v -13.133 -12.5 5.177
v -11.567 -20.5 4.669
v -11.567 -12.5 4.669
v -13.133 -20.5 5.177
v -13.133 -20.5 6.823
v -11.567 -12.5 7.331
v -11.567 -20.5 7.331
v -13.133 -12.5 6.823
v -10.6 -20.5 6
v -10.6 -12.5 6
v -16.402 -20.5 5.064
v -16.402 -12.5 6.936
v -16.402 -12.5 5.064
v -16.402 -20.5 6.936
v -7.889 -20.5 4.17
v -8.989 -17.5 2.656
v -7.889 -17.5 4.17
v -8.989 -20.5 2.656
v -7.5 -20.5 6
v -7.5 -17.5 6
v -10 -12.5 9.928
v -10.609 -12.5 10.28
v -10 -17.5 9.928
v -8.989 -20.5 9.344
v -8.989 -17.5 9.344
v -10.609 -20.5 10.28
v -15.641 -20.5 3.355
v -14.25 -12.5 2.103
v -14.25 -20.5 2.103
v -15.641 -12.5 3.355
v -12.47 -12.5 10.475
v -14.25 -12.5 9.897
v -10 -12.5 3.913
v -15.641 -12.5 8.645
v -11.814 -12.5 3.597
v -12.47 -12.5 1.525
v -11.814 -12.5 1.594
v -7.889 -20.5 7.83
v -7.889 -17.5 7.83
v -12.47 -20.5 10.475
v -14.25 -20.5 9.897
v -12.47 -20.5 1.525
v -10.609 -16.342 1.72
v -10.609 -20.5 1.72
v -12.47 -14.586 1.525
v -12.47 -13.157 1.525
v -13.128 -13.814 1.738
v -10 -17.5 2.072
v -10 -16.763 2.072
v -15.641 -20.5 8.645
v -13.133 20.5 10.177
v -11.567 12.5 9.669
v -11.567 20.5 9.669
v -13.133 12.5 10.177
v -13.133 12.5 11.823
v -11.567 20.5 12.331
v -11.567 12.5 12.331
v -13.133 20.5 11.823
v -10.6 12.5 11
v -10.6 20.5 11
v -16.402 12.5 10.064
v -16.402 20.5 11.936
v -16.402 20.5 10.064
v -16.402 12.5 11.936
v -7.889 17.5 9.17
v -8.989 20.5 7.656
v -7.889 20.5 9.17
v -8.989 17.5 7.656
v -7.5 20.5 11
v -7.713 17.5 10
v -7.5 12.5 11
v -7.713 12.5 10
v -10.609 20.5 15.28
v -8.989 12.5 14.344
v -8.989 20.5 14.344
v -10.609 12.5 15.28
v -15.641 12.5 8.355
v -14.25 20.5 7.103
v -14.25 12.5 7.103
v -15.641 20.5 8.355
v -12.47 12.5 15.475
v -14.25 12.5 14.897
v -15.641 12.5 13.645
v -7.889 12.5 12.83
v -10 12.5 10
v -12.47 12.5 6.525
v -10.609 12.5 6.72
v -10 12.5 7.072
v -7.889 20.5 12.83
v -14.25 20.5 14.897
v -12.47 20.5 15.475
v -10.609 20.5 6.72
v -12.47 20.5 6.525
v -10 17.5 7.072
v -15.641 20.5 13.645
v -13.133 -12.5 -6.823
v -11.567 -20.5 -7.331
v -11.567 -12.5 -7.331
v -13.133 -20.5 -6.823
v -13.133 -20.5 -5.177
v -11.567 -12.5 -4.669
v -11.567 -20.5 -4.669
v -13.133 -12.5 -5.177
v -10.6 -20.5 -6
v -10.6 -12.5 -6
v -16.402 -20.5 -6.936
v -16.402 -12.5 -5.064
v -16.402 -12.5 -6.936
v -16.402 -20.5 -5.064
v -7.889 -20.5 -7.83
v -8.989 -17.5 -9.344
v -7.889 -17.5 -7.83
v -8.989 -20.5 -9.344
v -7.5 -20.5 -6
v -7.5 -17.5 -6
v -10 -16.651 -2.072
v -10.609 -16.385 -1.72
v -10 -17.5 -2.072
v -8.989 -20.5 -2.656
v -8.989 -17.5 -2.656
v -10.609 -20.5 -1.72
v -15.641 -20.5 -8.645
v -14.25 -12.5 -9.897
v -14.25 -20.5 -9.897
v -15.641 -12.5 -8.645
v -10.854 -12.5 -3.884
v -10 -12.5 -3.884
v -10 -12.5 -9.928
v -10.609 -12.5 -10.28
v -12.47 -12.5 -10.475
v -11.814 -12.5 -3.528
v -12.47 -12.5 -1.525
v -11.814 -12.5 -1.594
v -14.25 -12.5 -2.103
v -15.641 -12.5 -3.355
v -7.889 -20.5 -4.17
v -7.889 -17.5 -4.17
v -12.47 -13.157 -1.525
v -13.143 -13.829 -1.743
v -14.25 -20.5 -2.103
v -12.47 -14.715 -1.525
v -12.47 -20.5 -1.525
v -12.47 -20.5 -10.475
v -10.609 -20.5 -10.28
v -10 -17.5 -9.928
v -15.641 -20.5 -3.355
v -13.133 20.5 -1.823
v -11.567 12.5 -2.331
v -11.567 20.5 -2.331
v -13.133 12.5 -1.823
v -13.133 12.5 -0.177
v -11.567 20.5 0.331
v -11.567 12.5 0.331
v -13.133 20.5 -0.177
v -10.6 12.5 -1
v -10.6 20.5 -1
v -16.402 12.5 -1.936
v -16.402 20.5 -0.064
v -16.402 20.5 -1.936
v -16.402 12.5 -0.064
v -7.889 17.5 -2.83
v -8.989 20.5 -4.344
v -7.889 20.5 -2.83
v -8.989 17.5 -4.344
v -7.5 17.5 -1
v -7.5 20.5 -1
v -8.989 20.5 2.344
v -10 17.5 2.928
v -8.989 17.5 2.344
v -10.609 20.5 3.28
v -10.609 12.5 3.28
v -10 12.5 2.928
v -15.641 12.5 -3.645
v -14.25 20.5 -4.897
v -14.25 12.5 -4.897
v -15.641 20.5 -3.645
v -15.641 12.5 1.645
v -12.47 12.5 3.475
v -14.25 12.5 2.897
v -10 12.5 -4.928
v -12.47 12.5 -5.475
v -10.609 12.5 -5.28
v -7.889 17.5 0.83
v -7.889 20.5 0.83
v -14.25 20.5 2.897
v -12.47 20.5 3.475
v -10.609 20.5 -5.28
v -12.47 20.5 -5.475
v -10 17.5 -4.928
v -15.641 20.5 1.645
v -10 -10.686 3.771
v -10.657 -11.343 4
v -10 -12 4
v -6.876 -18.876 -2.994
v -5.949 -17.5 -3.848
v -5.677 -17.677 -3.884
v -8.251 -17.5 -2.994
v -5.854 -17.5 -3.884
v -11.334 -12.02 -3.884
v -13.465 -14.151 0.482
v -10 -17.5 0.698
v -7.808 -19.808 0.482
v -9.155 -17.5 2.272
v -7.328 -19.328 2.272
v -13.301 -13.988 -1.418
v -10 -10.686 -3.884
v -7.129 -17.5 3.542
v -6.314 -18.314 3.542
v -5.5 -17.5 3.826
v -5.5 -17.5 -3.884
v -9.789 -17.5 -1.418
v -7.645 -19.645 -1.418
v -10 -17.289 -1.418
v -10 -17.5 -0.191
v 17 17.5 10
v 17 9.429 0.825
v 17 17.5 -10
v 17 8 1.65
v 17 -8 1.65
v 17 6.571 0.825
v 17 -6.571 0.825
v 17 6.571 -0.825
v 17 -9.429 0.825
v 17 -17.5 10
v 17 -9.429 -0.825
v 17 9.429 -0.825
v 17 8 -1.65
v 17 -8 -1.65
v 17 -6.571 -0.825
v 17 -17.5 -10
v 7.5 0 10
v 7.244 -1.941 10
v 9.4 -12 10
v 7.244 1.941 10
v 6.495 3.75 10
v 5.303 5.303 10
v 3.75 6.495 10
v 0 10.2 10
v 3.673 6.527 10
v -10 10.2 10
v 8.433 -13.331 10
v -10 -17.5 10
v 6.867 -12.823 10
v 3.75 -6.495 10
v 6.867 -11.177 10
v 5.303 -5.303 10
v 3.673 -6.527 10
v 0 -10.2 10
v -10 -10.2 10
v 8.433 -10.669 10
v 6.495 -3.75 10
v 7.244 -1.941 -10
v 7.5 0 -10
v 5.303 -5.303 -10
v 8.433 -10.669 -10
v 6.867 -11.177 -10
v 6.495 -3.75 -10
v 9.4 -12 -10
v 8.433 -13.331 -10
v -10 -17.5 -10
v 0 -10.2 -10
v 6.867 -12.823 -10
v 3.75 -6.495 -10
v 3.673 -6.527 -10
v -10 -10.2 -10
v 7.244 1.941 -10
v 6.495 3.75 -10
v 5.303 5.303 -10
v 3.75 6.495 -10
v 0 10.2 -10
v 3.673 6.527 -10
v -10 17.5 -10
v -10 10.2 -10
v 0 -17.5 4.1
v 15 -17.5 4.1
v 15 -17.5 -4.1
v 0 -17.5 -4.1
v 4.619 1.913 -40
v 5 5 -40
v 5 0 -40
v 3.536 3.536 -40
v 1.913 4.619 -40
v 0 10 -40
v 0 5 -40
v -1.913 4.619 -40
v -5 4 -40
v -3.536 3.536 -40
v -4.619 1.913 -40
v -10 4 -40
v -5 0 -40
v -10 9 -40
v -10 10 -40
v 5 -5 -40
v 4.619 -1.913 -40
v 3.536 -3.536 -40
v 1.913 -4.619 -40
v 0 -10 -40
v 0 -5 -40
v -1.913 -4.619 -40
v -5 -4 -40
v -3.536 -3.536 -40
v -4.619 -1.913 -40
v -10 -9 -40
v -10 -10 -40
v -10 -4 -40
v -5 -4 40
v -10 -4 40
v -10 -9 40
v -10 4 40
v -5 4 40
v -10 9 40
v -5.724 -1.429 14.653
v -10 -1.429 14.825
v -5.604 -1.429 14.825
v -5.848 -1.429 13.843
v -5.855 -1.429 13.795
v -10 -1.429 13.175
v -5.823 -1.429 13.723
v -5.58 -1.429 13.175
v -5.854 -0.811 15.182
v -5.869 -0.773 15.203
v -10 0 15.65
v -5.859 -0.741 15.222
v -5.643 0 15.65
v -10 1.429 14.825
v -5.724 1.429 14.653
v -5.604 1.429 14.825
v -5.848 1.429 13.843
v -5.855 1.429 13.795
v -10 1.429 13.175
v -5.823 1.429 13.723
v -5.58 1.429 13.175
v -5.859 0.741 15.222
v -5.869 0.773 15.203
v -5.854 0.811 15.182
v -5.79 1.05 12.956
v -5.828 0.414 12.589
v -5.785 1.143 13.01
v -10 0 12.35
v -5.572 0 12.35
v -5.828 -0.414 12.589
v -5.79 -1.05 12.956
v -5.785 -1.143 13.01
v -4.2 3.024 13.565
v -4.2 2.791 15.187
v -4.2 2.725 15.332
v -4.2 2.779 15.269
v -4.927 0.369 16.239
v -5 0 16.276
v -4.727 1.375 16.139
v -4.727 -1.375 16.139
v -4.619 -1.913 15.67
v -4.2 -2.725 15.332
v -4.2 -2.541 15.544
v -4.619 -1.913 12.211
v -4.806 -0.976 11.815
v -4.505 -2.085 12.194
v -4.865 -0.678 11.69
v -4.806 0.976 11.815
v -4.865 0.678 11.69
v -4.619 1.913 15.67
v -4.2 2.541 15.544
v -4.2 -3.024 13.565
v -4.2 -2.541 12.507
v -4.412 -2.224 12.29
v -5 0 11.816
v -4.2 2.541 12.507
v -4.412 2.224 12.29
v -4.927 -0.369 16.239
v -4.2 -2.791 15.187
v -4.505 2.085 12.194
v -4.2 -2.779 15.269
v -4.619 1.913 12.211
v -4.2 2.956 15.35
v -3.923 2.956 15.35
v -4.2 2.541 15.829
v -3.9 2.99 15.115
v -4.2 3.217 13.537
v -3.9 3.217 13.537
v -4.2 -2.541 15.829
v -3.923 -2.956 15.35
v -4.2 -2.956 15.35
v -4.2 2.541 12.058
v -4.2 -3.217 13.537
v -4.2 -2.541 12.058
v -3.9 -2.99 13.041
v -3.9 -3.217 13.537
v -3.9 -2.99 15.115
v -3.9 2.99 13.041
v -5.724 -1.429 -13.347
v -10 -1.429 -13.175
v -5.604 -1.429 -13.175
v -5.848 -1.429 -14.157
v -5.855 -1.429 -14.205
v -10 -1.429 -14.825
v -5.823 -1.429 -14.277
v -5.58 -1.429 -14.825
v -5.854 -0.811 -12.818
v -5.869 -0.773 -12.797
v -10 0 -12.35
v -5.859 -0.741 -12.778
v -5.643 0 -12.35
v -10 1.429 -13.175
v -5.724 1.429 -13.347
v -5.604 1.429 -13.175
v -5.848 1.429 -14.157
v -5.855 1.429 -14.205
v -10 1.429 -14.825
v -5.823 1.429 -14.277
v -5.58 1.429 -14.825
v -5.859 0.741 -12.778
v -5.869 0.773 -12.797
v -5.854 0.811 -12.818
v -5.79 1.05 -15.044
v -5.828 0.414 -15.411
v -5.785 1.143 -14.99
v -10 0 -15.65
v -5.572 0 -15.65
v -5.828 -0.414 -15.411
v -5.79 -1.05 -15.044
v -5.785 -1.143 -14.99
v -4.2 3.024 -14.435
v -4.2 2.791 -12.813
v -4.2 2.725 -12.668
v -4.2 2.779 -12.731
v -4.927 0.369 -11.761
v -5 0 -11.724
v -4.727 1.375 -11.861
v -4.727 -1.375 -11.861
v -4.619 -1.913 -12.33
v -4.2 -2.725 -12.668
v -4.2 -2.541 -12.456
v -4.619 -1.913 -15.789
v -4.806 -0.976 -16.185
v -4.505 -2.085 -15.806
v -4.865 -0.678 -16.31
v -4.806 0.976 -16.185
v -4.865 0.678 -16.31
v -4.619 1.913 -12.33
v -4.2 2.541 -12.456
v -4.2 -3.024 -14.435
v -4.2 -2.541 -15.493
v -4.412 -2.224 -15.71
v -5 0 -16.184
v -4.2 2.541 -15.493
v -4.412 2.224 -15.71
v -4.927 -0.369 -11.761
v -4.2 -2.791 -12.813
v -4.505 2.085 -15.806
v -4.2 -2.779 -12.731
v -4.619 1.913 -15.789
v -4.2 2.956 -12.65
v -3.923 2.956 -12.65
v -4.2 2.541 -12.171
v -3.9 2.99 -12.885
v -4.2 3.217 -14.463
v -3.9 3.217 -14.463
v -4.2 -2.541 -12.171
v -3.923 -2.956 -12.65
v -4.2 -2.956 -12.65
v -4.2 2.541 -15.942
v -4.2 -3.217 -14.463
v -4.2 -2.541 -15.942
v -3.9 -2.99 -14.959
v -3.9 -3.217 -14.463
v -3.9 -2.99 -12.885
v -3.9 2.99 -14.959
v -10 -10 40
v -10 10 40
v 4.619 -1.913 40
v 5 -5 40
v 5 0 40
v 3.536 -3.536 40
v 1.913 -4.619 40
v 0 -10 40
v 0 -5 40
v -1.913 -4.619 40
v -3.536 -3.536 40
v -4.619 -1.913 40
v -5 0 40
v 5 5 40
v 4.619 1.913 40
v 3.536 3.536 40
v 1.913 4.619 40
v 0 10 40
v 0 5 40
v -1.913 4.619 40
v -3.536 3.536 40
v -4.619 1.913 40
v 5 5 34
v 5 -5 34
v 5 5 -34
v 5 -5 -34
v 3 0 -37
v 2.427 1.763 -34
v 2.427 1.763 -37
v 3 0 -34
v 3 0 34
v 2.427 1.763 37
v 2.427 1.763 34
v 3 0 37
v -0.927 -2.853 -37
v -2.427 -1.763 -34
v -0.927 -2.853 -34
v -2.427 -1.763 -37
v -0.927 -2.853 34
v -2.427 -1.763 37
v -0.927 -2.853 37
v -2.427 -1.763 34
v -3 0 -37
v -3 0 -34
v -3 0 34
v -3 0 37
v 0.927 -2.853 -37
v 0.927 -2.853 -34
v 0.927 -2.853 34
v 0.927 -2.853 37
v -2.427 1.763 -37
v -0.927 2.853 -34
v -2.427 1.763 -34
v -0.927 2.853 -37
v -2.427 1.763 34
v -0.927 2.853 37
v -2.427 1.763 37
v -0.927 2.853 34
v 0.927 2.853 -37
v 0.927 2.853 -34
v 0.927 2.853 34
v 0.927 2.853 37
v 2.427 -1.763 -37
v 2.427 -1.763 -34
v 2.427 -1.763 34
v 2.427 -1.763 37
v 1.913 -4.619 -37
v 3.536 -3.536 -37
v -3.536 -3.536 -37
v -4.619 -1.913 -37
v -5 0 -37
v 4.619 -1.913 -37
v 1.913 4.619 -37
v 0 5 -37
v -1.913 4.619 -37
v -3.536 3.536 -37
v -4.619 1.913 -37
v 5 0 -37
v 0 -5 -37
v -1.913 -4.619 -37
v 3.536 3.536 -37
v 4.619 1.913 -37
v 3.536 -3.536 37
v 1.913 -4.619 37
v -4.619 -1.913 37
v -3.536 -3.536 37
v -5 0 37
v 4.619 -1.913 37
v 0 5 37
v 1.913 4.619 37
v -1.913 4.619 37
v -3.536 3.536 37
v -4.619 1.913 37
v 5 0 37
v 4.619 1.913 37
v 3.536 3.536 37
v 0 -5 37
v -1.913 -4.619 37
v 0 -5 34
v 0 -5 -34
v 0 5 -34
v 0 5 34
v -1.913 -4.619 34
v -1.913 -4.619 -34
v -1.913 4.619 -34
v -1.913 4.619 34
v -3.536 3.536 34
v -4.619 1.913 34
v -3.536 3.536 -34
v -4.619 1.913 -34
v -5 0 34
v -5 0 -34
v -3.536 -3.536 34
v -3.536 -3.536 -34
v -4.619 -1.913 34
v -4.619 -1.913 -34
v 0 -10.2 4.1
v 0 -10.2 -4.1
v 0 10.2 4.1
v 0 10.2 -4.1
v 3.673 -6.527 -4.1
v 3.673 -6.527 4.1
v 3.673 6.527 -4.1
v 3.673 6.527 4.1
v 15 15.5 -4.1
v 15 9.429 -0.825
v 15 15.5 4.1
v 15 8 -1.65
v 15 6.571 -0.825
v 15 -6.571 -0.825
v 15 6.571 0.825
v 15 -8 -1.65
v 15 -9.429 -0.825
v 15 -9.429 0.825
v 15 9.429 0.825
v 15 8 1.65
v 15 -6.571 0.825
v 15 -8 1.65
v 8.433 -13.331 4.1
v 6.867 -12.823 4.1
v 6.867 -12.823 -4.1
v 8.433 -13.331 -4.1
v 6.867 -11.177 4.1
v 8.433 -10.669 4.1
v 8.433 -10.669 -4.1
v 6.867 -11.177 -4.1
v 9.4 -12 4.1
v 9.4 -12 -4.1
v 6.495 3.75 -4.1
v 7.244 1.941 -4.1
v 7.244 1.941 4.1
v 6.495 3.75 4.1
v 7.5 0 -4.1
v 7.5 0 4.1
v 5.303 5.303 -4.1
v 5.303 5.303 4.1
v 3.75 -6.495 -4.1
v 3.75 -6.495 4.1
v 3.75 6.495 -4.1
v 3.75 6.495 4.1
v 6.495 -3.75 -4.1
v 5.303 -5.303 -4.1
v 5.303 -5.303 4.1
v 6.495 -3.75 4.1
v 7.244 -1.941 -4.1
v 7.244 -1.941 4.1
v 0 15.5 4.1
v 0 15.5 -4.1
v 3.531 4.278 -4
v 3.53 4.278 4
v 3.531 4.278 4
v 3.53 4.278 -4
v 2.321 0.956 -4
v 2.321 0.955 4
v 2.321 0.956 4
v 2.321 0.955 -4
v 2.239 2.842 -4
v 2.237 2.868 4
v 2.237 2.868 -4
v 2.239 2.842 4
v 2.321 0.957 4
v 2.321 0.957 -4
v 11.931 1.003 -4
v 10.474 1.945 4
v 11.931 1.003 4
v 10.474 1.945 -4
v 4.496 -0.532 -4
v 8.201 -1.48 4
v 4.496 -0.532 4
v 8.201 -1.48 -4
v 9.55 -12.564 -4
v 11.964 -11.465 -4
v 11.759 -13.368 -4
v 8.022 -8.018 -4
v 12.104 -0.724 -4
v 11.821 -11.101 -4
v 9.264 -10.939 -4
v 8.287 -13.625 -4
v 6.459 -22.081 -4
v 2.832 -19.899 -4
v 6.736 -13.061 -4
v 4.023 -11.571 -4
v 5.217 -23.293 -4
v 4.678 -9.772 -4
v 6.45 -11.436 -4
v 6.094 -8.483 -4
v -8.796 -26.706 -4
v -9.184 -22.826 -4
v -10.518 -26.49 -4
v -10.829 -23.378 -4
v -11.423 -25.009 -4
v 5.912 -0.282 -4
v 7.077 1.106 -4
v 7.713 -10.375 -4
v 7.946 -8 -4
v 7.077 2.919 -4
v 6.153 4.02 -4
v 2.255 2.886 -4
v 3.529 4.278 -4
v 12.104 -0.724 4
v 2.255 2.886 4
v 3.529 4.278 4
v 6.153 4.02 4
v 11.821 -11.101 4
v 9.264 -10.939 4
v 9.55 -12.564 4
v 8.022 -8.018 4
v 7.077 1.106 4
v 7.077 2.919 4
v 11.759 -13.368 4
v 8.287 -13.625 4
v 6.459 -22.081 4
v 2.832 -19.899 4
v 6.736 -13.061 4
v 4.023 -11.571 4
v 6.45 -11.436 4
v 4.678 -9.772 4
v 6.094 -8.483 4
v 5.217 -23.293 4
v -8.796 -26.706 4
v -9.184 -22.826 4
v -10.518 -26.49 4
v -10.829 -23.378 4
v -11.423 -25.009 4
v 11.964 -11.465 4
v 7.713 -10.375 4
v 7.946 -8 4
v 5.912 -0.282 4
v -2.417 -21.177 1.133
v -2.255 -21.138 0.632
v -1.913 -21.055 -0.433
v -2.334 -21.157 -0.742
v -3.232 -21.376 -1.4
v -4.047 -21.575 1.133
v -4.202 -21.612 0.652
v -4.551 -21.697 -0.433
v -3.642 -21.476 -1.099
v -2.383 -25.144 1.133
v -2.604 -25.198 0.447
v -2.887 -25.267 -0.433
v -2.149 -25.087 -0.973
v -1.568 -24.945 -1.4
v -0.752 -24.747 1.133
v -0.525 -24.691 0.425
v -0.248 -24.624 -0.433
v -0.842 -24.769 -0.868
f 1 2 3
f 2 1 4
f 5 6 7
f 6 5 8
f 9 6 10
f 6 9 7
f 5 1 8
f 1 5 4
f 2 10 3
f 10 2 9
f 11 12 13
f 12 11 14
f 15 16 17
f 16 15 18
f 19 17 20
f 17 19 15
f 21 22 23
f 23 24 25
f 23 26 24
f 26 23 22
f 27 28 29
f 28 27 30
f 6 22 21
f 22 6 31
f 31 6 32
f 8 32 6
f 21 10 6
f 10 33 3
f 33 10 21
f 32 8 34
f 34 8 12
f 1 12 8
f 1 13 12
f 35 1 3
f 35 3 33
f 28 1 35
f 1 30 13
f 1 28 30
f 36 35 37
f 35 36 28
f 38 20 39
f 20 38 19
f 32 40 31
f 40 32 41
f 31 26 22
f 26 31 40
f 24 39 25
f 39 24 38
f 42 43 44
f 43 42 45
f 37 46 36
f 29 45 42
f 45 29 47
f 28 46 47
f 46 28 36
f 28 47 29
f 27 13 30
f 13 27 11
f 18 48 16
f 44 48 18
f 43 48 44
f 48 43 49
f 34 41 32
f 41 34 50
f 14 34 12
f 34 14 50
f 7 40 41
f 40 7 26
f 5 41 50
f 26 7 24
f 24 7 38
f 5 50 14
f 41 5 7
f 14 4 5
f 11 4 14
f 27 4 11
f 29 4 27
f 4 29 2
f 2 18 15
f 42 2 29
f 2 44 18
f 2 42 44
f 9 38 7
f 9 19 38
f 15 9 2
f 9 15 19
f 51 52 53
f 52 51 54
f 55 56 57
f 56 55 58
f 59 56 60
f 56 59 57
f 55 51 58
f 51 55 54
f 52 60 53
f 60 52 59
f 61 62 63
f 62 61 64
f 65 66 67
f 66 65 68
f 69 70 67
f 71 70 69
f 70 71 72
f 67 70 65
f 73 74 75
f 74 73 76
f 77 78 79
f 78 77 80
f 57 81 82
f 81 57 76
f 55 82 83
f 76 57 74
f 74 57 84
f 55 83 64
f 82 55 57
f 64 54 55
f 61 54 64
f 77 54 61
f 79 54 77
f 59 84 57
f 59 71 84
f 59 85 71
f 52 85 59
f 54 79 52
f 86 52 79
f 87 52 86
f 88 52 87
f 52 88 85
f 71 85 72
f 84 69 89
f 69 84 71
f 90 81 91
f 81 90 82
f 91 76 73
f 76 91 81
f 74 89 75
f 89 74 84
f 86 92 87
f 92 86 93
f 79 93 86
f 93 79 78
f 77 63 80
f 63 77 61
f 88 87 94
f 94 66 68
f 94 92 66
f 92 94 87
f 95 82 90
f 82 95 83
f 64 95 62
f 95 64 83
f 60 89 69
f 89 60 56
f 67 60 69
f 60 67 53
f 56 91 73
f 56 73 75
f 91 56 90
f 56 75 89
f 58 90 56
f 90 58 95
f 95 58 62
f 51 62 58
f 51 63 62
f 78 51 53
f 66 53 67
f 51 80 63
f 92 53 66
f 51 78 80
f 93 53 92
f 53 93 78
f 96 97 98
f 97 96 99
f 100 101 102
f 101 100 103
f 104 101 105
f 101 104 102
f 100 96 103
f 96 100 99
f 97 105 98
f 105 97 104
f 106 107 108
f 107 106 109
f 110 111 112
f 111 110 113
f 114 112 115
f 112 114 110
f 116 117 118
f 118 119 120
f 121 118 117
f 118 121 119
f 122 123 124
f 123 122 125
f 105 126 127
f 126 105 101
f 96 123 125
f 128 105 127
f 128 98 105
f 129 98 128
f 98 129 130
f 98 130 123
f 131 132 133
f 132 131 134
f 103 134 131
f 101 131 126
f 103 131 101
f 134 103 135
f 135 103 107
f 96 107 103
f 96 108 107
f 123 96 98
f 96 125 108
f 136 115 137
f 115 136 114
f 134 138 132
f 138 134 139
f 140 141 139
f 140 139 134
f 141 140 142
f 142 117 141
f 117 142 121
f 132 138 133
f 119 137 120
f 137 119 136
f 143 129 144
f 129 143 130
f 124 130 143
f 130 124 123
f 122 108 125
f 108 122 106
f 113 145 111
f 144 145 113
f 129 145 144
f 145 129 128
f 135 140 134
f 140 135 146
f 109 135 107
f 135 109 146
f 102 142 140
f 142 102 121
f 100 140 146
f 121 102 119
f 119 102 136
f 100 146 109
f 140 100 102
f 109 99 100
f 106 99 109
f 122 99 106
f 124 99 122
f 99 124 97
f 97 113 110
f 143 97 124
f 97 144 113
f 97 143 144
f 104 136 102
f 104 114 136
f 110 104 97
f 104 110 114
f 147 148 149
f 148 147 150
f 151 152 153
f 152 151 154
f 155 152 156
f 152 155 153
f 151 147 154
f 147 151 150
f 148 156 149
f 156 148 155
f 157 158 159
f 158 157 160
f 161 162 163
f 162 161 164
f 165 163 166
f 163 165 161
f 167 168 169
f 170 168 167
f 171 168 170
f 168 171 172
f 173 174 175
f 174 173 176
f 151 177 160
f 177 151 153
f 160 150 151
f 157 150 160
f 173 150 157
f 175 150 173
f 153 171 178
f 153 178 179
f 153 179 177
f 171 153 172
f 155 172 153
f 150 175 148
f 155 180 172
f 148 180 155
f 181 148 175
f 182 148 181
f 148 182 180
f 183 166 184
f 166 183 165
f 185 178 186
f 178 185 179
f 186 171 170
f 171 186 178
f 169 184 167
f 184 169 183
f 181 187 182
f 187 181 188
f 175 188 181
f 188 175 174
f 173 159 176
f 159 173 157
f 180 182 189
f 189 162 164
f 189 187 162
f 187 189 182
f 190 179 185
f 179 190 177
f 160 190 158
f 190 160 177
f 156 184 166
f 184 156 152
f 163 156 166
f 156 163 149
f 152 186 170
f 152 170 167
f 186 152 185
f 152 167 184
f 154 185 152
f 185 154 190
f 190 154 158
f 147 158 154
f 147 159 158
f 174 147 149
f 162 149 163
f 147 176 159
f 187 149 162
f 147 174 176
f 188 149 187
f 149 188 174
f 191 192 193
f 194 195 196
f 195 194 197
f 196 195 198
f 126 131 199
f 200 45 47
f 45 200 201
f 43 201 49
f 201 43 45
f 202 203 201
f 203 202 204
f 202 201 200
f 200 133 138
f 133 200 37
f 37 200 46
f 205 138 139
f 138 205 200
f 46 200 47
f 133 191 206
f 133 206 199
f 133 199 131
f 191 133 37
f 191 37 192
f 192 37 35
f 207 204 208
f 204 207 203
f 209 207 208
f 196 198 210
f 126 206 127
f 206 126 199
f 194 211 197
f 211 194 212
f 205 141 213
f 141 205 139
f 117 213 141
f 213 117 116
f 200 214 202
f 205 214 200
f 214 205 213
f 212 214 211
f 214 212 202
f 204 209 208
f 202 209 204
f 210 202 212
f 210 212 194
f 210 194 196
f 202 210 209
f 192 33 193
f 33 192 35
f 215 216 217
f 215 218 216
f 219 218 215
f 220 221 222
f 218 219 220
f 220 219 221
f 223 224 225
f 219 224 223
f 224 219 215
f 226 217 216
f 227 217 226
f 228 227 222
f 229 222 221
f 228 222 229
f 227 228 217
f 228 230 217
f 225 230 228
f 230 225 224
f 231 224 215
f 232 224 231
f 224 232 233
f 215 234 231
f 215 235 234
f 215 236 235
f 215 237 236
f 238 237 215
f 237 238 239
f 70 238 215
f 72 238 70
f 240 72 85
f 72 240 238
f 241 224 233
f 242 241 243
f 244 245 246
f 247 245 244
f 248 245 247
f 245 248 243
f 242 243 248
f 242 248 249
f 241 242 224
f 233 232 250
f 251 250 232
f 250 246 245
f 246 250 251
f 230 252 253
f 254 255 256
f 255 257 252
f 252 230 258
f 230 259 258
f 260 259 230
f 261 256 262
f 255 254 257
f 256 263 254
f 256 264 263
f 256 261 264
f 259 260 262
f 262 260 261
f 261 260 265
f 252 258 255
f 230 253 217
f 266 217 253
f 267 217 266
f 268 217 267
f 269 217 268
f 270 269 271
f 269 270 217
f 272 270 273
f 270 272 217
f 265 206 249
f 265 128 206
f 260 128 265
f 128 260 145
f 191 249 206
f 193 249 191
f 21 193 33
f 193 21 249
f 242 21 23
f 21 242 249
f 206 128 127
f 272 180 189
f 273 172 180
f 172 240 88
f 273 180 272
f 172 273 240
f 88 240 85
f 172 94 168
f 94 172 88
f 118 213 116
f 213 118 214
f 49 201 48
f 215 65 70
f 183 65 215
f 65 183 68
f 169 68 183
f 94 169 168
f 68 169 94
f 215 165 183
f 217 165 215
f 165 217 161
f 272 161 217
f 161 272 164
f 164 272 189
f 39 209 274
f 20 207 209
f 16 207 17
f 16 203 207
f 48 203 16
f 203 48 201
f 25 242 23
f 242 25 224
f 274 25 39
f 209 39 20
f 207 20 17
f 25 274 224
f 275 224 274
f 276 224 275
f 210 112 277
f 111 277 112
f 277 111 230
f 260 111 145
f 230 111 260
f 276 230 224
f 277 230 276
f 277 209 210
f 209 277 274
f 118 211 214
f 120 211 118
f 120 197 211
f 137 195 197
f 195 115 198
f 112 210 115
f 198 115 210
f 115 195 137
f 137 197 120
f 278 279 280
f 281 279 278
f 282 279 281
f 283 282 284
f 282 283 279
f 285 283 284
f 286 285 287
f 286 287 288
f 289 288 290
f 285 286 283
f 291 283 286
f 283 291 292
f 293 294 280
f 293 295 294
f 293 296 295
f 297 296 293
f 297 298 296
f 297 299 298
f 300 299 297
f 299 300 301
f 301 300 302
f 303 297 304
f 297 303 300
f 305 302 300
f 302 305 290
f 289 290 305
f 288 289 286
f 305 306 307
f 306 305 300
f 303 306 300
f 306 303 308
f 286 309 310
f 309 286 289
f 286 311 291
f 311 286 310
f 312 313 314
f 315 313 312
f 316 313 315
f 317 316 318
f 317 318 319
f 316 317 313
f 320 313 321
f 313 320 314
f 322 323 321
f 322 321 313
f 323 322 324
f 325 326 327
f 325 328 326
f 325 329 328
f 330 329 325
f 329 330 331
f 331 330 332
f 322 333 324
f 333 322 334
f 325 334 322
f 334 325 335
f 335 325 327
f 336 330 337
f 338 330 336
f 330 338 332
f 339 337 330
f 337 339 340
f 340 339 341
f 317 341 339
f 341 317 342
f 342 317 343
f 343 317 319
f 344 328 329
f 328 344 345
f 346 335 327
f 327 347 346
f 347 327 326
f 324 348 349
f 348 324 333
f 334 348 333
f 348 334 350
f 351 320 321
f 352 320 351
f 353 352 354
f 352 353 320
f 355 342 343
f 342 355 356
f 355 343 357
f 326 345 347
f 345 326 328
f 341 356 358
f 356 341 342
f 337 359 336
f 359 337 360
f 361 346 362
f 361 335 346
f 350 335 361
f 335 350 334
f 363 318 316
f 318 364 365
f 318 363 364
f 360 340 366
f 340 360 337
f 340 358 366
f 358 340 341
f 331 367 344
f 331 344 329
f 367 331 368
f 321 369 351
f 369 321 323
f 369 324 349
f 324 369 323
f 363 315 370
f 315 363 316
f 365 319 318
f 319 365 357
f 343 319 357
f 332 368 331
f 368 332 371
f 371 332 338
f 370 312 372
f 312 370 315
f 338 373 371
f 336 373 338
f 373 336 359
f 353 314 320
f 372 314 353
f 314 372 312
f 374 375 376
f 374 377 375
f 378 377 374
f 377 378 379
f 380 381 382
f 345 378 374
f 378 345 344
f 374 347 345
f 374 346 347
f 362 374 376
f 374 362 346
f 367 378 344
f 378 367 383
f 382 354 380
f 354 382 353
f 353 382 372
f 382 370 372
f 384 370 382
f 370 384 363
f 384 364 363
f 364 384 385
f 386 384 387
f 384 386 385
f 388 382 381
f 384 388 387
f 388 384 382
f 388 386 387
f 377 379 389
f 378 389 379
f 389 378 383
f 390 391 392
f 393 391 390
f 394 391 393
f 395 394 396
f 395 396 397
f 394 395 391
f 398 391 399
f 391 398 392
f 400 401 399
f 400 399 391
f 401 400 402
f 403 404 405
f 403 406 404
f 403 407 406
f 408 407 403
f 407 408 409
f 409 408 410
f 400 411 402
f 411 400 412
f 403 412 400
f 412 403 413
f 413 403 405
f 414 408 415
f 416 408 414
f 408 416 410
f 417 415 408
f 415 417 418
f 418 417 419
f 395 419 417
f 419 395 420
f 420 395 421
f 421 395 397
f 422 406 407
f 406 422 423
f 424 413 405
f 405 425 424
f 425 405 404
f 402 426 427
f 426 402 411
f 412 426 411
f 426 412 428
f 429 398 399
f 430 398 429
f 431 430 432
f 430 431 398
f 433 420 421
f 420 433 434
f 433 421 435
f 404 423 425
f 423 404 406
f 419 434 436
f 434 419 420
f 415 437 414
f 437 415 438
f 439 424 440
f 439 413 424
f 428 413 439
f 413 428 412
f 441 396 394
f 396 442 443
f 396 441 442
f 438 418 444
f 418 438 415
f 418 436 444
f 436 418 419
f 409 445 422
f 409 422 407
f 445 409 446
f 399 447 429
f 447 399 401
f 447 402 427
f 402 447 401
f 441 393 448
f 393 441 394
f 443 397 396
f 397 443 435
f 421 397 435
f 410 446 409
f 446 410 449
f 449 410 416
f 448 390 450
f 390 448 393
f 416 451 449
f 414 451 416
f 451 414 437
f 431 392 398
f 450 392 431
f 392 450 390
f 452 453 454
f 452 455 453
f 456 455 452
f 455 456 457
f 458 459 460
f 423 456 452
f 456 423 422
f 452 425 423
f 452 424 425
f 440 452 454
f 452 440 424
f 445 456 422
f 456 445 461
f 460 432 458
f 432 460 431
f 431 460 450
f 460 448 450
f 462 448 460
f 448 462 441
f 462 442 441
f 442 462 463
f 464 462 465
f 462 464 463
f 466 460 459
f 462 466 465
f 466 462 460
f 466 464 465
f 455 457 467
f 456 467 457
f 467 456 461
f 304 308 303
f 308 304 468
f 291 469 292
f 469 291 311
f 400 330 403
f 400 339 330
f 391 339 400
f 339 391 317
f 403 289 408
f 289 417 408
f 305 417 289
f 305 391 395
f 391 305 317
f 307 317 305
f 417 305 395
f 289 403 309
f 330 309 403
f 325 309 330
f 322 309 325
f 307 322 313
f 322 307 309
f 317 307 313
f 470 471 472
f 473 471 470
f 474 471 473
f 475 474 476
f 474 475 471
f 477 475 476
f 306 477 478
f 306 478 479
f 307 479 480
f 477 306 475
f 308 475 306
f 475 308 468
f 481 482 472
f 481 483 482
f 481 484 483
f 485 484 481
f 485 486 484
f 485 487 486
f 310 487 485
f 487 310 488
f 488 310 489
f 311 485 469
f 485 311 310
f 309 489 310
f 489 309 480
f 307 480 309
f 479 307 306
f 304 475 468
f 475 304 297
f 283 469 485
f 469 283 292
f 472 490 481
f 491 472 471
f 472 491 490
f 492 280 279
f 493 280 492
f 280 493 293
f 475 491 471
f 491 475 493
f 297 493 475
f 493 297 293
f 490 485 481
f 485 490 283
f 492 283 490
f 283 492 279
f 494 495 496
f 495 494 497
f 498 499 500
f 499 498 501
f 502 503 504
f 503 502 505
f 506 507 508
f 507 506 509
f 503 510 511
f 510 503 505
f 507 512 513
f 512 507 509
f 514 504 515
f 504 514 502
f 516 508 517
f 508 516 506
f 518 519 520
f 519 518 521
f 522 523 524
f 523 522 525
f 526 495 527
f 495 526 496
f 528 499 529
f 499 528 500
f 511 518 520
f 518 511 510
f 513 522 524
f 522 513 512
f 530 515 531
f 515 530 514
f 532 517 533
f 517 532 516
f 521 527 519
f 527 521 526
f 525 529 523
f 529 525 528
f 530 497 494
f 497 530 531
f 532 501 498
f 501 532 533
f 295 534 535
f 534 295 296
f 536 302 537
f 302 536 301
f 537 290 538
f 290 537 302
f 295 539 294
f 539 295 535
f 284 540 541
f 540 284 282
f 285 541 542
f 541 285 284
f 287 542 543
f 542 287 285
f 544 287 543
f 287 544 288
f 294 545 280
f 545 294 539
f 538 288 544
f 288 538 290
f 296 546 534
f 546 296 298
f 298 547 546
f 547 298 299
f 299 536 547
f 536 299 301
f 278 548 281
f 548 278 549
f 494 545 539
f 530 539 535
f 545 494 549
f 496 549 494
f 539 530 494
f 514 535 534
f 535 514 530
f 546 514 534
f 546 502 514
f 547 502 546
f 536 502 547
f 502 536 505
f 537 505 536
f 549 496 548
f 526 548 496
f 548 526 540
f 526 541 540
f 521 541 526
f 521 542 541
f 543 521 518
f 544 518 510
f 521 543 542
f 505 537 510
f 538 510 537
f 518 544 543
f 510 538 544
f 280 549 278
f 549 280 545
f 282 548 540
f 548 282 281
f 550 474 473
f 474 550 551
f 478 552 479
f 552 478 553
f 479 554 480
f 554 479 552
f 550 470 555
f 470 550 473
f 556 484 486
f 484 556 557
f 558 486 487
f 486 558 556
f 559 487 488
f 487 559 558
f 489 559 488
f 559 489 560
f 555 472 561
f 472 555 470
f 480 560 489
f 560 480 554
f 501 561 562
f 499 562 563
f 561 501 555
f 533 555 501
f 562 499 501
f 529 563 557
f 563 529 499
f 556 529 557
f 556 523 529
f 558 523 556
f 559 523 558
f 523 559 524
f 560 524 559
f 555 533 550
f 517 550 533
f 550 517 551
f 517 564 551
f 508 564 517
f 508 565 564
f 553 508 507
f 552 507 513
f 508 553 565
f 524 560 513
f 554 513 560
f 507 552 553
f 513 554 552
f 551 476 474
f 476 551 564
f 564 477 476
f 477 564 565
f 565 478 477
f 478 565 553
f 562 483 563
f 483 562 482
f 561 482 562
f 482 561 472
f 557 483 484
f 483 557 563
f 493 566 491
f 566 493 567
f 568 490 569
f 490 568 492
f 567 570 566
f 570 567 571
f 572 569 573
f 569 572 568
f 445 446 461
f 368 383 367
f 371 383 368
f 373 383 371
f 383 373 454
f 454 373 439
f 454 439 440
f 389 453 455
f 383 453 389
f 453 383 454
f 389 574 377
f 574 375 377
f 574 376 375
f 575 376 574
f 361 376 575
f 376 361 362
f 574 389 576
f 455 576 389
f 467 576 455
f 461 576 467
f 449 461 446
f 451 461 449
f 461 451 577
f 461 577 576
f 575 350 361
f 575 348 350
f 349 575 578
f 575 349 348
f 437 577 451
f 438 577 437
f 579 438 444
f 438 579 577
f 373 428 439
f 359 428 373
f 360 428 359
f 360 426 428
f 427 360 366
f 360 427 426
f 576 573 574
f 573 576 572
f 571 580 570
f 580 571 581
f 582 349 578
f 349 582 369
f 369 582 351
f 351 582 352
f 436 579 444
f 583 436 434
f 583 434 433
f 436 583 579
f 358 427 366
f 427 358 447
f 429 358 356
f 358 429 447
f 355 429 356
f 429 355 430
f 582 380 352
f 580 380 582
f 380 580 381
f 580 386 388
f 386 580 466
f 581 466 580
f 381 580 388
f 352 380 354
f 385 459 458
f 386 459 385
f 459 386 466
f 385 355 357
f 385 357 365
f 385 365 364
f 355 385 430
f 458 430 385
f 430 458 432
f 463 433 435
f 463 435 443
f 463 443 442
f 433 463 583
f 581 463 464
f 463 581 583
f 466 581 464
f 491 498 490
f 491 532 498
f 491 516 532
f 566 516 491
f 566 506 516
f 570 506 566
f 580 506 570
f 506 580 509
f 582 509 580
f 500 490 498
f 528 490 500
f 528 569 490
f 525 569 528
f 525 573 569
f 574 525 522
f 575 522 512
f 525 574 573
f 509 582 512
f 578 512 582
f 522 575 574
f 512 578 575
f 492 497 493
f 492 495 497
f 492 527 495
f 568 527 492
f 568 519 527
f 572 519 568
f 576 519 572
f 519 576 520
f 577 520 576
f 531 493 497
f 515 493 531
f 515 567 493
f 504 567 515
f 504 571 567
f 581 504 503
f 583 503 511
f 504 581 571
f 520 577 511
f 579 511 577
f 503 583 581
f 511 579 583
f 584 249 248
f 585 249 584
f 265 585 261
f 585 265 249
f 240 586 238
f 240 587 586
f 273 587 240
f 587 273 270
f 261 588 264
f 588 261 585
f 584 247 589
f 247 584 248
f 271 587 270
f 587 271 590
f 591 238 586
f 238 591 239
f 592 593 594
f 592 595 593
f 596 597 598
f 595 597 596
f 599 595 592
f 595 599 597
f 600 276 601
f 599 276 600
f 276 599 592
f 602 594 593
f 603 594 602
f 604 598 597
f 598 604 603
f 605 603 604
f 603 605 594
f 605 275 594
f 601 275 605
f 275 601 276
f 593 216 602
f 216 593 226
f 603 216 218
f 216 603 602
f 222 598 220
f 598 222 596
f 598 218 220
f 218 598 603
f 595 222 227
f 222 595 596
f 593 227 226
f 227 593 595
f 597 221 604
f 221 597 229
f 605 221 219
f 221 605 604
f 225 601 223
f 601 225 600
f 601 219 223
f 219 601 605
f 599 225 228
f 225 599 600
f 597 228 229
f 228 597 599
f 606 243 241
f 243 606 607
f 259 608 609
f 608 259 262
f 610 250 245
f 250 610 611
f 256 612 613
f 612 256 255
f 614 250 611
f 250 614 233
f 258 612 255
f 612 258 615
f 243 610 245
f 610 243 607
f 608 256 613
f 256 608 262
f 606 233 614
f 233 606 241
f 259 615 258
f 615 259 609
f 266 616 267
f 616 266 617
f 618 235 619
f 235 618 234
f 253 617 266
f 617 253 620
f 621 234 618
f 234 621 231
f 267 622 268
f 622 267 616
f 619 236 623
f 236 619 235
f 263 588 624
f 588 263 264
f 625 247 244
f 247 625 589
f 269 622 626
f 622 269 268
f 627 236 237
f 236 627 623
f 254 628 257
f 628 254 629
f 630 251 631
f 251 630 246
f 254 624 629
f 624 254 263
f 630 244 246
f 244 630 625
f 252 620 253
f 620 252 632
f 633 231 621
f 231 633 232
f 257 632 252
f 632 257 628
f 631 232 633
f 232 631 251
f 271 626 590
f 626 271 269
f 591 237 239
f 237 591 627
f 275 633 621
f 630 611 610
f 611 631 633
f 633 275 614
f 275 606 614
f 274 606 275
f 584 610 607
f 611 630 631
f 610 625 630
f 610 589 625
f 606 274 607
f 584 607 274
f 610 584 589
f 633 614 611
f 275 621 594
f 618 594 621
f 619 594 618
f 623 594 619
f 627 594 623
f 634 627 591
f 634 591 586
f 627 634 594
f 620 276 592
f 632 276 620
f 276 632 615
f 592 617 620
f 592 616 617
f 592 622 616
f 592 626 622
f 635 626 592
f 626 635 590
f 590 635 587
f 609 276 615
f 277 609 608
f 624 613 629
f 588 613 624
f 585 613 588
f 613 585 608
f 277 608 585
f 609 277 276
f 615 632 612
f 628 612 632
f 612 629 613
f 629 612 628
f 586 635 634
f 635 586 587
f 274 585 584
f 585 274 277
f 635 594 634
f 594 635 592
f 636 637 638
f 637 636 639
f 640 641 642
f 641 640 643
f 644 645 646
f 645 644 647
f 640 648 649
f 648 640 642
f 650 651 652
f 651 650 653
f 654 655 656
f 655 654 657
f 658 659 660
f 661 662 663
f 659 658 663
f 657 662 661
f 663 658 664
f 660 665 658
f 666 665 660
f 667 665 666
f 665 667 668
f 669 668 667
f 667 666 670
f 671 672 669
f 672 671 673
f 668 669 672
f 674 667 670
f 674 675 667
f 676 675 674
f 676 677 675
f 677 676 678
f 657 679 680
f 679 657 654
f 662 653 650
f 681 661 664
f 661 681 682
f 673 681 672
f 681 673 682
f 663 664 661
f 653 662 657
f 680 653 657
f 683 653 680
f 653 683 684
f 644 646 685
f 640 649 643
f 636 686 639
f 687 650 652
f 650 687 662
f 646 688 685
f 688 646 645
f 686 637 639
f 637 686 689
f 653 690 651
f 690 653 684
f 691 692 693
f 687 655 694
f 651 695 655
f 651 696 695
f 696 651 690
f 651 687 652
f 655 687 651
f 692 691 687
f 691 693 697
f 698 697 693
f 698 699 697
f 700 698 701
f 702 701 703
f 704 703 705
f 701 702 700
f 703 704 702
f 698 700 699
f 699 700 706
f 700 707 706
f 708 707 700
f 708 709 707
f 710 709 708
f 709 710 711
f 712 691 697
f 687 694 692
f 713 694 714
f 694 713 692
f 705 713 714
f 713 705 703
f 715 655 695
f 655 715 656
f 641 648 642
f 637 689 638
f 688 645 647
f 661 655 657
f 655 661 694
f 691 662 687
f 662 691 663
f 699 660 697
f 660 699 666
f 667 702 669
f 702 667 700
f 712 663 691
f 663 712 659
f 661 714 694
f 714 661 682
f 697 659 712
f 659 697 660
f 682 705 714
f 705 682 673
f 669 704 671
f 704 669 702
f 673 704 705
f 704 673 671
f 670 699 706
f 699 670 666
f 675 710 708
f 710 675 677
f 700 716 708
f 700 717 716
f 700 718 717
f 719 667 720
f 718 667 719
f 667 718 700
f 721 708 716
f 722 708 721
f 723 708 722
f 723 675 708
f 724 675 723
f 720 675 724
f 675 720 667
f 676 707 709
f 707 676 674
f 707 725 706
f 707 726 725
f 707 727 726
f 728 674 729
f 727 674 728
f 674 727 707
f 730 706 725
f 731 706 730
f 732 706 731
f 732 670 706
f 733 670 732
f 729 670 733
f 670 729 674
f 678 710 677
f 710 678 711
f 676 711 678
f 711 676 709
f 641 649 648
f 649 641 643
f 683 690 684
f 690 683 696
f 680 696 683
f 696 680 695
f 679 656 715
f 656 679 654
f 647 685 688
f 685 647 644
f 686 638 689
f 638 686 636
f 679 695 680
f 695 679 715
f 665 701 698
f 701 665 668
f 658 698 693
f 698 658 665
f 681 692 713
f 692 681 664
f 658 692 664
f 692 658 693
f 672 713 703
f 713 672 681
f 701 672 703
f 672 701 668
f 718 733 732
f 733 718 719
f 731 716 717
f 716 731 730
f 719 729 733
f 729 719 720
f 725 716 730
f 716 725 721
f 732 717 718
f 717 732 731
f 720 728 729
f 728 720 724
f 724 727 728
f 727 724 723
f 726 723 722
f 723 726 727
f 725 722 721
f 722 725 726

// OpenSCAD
// file: common_parts.scad
include <tunable_constants.scad>;
//common_flat_screw_tap();
module M3_flat_screw(l = 10, l2 = 0) {
    // l2 is amount of the screw that are bigger for sliding through the hole
    tap_z = 1.9;
    rotate([180,0,0])
    union() {
        cylinder(d = C_M3_DIAMETER_THREAD, h= l);
        cylinder(d = C_M3_DIAMETER, h= l2);
        translate([0,0,-0.1+0.1]) cylinder(d1 = 6.5, d2= C_M3_DIAMETER_THREAD, h= tap_z);
        translate([0,0,-0.1]) cylinder(d = 6.5, h= 0.3);
    }
}

module M4_button_screw(l = 10, l2 = 0) {
    rotate([180,0,0])
    union() {
        cylinder(d = C_M4_DIAMETER_THREAD, h= l);
        cylinder(d = C_M4_DIAMETER, h= l2);
        translate([0,0,-4]) cylinder(d = 8, h=4);
    }
}
module M3_button_screw(l = 10, l2 = 0) {
    rotate([180,0,0])
    union() {
        cylinder(d = C_M3_DIAMETER_THREAD, h= l);
        cylinder(d = C_M3_DIAMETER, h= l2);
        translate([0,0,-4]) cylinder(d =6, h=4);
    }
}

module roundedcube(xdim ,ydim ,zdim,rdim){
    hull(){
        fn=30;
        translate([rdim,rdim,0]) cylinder(r=rdim, h=zdim, $fn=fn);
        translate([xdim-rdim,rdim,0])cylinder(r=rdim, h=zdim, $fn=fn);

        translate([rdim,ydim-rdim,0]) cylinder(r=rdim, h=zdim, $fn=fn);
        translate([xdim-rdim,ydim-rdim,0]) cylinder(r=rdim, h=zdim, $fn=fn);
    }
}
//beam45();
module beam45(w = 10, l = 10, h = 8) {
    difference() {
        union() {
            translate([-w/2,0,0]) cube([w,l,h]);
        }
        translate([w/2,0,0]) rotate([0,45,0])translate([-w-h,-1,0]) cube([w+h*2,l+2,h*2]);
        translate([-w/2,0,0]) rotate([0,-45,0])translate([0-w,-1,0]) cube([w+h*2,l+2,h*2]);
    }
}
//beam30();
module beam30(w = 10, l = 10, h = 8) {
    difference() {
        union() {
            translate([-w/2,0,0]) cube([w,l,h]);
        }
        translate([w/2,0,0]) rotate([0,90-30,0])translate([-w-h,-1,0]) cube([w+h*2,l+2,h*2]);
        translate([-w/2,0,0]) rotate([0,-90+30,0])translate([0-w,-1,0]) cube([w+h*2,l+2,h*2]);
    }
}

halfbeam30(w = 100, l = 10, h = 8);
module halfbeam30(w = 10, l = 10, h = 8) {
    difference() {
        union() {
            translate([-w/2,0,0]) cube([w,l,h]);
        }
        translate([0,-l*0.1,0])rotate([0,+30,0]) cube([w+l+h,w+l+h+l*0.1,w+l+h]);
        //translate([-w/2,0,0]) rotate([0,-90+30,0])translate([0-w,-1,0]) cube([w+h*2,l+2,h*2]);
    }
}



module cylinder_outer(height,radius,fn){
   fudge = 1/cos(180/fn);
   cylinder(h=height,r=radius*fudge,$fn=fn);
}

//indicator_dots(2);

module indicator_dots(valueIn) {
    for (a =[0:1:valueIn-1]) {
        translate([a*3,0,0]) cube([2,2,1]);
    }
}
// file: tunable_constants.scad
// Change parameters to fit your printer and slicer differences

C_M3_DIAMETER = 3.3; // size of a hole that a M3 screw will slide through
C_M3_DIAMETER_THREAD = 2.8; // size of a hole that a M3 screw will create own threads in

C_M3_NUT = 7;

C_KINGPIN_LOOSE = 3.5; // The hole for kingpin in the arms that are suposed to slide
C_KINGPIN_SNUG = 3.3; // The hole in the steering hub where the kingpin is suposed to be tightly locked with a screw

C_M4_NUT = 8.4;

C_M4_DIAMETER = 4.1; // size of a hole that a M4 screw will slide through
C_M4_DIAMETER_THREAD = 3.8; // size of a hole that a M4 screw will create own threads in

    b_12mm_tol = 0.3; // tolerance for bearing with 12mm diameter

C_12MM_BEARING_D = 12+b_12mm_tol; // Size of a hole that hold a 12mm bearing
C_12MM_BEARING_H = 3.5;

C_8MM_LOOSE = 8.7; // Loose fitting that will guarantie that it will not touch
C_8MM_TIGHT = 8.2; // Tight fitting for indrive etc
C_8MM_FIT = 8.5; // Perfect fit for it to be removable but not by much force, used for left wheel mount

C_SIGHT_MOUNT_S = 33.3375;
C_SIGHT_SCREW_D = 4.7;

C_MOUNT1_W = 28;
// ############# Settings ################
S_CASTER = 4;
S_CAMBER = 2;

S_BAR_W = 25;
S_BAR_H = 5;
// main file
//
include <tunable_constants.scad>;
use <common_parts.scad>



//copper_stick();
copper_block();

// hinge pin

hp_x = 8;
hp_y = -12;
hp_d = 3;

// hinge
hz = 8;

// bearing MR63
bearing_d = 6;
bearing_h = 2.5;

// stick
sw = 8+2*2+2.5*2;
sl = 120;
sh = 10;
sx = 14;
// stick walls around adjust screw
swall = 5;

    // grove
    gx = 4;
    gy = 8;
    gz = sl - swall*2;
    





sx = 20;
sy = 20;
sz = 80;

// Block
b_x = 25;
b_y = 35;
b_h = 20;

copper_stick();
module copper_stick() {
    rotate([0,0,180]) difference() {
        union() {
            translate([-sx/2, -sy/2, -sz/2]) cube([sx,sy,sz]);
            
        }
        
        translate([-sx-10/2, -sy/2, -sz/2]) cube([sx,sy,sz]);
        
        translate([-10/2, sy/2-5, -sz/2]) rotate([0,0,45]) cube([sx,sy,sz]);
        mirror([0,1,0])translate([-10/2, sy/2-5, -sz/2]) rotate([0,0,45]) cube([sx,sy,sz]);
        
        translate([sx/2-5,sy/2-6, -sz/2]) halfbeam45(x=20,y=20,z=100);
        mirror([0,1,0])  translate([sx/2-5,sy/2-6, -sz/2]) halfbeam45(x=20,y=20,z=100);
        
        translate([0,0, -sz/2-1]) cylinder(d=6, h=110);
        
        translate([0,0, -sz/2-1]) cylinder(d=10, h=4);
        translate([0,0, -sz/2+sz-3]) cylinder(d=10, h=4);
        
        
        hull() {
            temp = sz - 12;
            translate([0,0,-temp/2]) cylinder(d=10, h=temp);
            translate([-50,0,-temp/2]) cylinder(d=10, h=temp);
        }
        
        translate([4, 0, +C_MOUNT1_W/2]) rotate([0,-90,0]) M3_flat_screw(l=30,l2=20);
        translate([4, 0, -C_MOUNT1_W/2]) rotate([0,-90,0]) M3_flat_screw(l=30,l2=20);
    }
    
    
}


module halfbeam45(x=20, y=10,z=10) {
    
    difference() {
        
        cube([x,y,z]);
        rotate([0,0,45]) cube([x*2,y,z]);
    }
    
}


module copper_stick2() {

    difference() {
        union() {
            //translate([-w/2,0,0]) cube([w,l,h]);
            translate([-sh,-sw/2,-sl/2]) cube([sh,sw,sl]);
            translate([0,0,-sl/2]) cylinder(d=14,h=swall);
            translate([0,0,sl/2-swall]) cylinder(d=14,h=swall);
            
        }
        translate([-sh,sx/2,-sl/2]) rotate([0,0,90-45]) cube([sh,sw,sl]);
        translate([-sh,-sx/2,-sl/2]) rotate([0,0,90+45]) translate([-sh,0,0]) cube([sh,sw,sl]);
        
        
        // grove
        translate([-sh+gx,-gy/2,-gz/2]) cube([gx+100,gy,gz]);
        
        screws();
        %screws();
    }
}

module screws() {

    translate([0-sh+gx, 0, +C_MOUNT1_W/2]) rotate([0,90,0]) M3_flat_screw(l=30,l2=20);
    translate([0-sh+gx, 0, -C_MOUNT1_W/2]) rotate([0,90,0]) M3_flat_screw(l=30,l2=20);

    translate([0-sh+gx, 0,C_MOUNT1_W/2 +C_MOUNT1_W/2]) rotate([0,90,0]) M3_flat_screw(l=30,l2=20);
    translate([0-sh+gx, 0,C_MOUNT1_W/2 -C_MOUNT1_W/2]) rotate([0,90,0]) M3_flat_screw(l=30,l2=20);
    
    translate([0-sh+gx, 0,C_MOUNT1_W +C_MOUNT1_W/2]) rotate([0,90,0]) M3_flat_screw(l=30,l2=20);

    // main adjust screw
    translate([0,0,-sl]) cylinder(d=5.1, h=sl*2);
    
    // bearings
    translate([0,0,-sl/2]) %cylinder(d=10.1, h=4);
    translate([0,0,sl/2-4]) %cylinder(d=10.1, h=4);
}
%block_screws();
module block_screws() {

    translate([b_x-sh,8,0]) rotate([0,-90,0]) M3_button_screw(l=30,l2=20);
    translate([b_x-sh,-8,0]) rotate([0,-90,0]) M3_button_screw(l=30,l2=20);

    translate([0,0,b_h/2-8/2]) bearingscrewss();
    translate([0,0,-b_h/2+8/2]) bearingscrewss();
    
        //hinge pin hole
    translate([hp_x,hp_y,-b_h]) cylinder(d=C_M3_DIAMETER_THREAD, h=30);
}

module copper_block() {
    
    difference() {
        union() {
            translate([0,0,b_h/2-8/2])bearingholderss();
            translate([0,0,-b_h/2+8/2]) bearingholderss();
            
            translate([-sh+5,-17,0]) rotate([0,0,-45]) rotate([0,-90,0]) cylinder(d=8, h=8);
            
            translate([-sh+0,-b_y/2,-b_h/2]) cube([b_x+2,b_y,b_h]);
            
        }
        // stick clearing
        translate([-sh,-sw/2-0.5,-sl/2]) cube([sh+1,sw+1,sl]);
        
        translate([0,0,-b_h]) cylinder(d=15, h=b_h*2);
        
        // hole inside
        h2 = hz+0.2;
        translate([0,-b_y/2,-h2/2]) cube([b_x-sh,b_y-2,h2]);
        
        scale(1.02) copper_stick();
        
        block_screws();
    }
}


module bearingholderss() {
    translate([-sh+1,-sx/2,0]) rotate([0,0,0]) rotate([-90,0,0]) bearingholder();
    mirror([0,1,0]) translate([-sh+1,-sx/2,5]) rotate([0,0,0]) rotate([-90,0,0]) bearingholder();
}


module bearingholder() {
    xx = 8;
    yy = 8;
    zz = 8;

    translate([-bearing_d/2,0,-bearing_h]) difference() {
        union() {
            //%translate([-xx/2,-yy/2,-zz]) cube([xx,yy,zz]);
            translate([0, 0, -zz]) cylinder(d=9, h=zz);
            color("blue") %cylinder(d = bearing_d, h = bearing_h);
            translate([0,0,4.5]) rotate([0,0,0]) %M3_flat_screw(l=12,l2=0);
        }
        translate([0,0,4.5]) rotate([0,0,0]) M3_flat_screw(l=22,l2=0);
    }
}
module bearingscrew() {
    //translate([-bearing_d/2,0,-bearing_h]) translate([0,0,4.5]) rotate([0,0,0]) M3_flat_screw(l=22,l2=0);
}
module bearingscrewss() {
    translate([-sh,-sx/2,0]) rotate([0,0,45]) rotate([-90,0,0]) bearingscrew();
    mirror([0,1,0]) translate([-sh,-sx/2,0]) rotate([0,0,45]) rotate([-90,0,0]) bearingscrew();
}

%copper_hinge();
translate([hp_x, hp_y,0]) rotate([0,0,-20]) translate([-hp_x, -hp_y,0]) copper_hinge();
module copper_hinge() {
    hh = hz;
    translate([0,0,-hz/2]) difference() {
        union() {
            hull() {
                cylinder(d=5, h=hz);
                translate([6,0,0]) cylinder(d=4, h=hz);
            }
            hull() {
                translate([6,0,0]) cylinder(d=4, h=hz);
                translate([hp_x+2,hp_y,0]) cylinder(d=4, h=hz);
            }
            hull() {
                translate([hp_x,hp_y,0]) cylinder(d=8, h=hz);
                translate([hp_x,hp_y-10,0]) cylinder(d=4, h=hz);
            }
            hull() {
                translate([hp_x,hp_y-10,0]) cylinder(d=4, h=hz);
                translate([hp_x-12,hp_y-18,0]) cylinder(d=4, h=hz);
            }
            
        }
        translate([0,0,-0.1]) cylinder(d=5+0.3, h=hz+1);
        
        //hinge pin hole
        translate([hp_x,hp_y,0]) cylinder(d=C_M3_DIAMETER, h=30);
        
        // spring screw
        translate([-6,-18,hz/2]) rotate([0,0,-45]) rotate([0,90,0])  cylinder(d=C_M3_DIAMETER_THREAD, h=30);
    }
}
